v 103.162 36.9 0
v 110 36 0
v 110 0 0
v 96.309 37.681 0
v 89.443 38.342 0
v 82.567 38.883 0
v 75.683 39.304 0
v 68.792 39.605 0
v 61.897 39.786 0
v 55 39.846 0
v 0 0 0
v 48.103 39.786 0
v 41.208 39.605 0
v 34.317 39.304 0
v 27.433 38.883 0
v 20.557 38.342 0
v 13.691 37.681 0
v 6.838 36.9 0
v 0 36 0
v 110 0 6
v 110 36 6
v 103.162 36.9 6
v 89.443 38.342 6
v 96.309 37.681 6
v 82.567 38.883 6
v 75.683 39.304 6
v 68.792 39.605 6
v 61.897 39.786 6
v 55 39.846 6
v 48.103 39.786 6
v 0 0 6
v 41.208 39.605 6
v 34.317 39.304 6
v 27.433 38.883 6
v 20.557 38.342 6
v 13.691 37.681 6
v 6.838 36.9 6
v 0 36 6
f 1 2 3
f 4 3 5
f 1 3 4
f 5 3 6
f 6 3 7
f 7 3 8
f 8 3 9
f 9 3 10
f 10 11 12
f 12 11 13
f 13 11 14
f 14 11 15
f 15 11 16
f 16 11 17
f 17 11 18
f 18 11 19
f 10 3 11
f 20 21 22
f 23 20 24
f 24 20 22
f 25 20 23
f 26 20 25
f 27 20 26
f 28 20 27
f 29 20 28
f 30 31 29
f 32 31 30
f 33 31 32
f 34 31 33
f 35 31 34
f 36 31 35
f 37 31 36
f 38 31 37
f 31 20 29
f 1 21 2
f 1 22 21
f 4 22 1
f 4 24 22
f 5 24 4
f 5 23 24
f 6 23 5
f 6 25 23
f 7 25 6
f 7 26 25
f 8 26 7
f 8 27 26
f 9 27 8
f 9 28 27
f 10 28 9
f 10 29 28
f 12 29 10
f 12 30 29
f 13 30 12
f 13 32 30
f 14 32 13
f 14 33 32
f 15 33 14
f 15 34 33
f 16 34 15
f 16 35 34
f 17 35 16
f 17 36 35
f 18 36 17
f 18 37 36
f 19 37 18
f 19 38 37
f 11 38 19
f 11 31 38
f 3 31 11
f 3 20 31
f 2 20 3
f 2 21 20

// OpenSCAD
$fn = 32;

// ----------------------------------------------------------------------
// Arc profile plate: crown, 19 points
// ----------------------------------------------------------------------

// --- parameters (mm) ---
bar_l = 110;              // bar length, X
bar_w = 36;               // bar height at the ends, Y
arc_r = 395.19;           // radius of the crown arc
arc_angle = 16;           // crown arc angle, degrees
crown_rise = 3.85;        // rise of the crown over the ends
arc_step = 1;             // sampling step of the crown arc, degrees
plate_t = 6;              // plate thickness, Z

bbox_y = bar_w + crown_rise;  // full height with the crown

profile = [[110, 36], [103.162, 36.9], [96.309, 37.681], [89.443, 38.342], [82.567, 38.883], [75.683, 39.304], [68.792, 39.605], [61.897, 39.786], [55, 39.846], [48.103, 39.786], [41.208, 39.605], [34.317, 39.304], [27.433, 38.883], [20.557, 38.342], [13.691, 37.681], [6.838, 36.9], [0, 36], [0, 0], [110, 0]];  // primary outline, 19 points, counter clockwise

// --- the one profile operation ---
linear_extrude(height = plate_t) polygon(points = profile);
